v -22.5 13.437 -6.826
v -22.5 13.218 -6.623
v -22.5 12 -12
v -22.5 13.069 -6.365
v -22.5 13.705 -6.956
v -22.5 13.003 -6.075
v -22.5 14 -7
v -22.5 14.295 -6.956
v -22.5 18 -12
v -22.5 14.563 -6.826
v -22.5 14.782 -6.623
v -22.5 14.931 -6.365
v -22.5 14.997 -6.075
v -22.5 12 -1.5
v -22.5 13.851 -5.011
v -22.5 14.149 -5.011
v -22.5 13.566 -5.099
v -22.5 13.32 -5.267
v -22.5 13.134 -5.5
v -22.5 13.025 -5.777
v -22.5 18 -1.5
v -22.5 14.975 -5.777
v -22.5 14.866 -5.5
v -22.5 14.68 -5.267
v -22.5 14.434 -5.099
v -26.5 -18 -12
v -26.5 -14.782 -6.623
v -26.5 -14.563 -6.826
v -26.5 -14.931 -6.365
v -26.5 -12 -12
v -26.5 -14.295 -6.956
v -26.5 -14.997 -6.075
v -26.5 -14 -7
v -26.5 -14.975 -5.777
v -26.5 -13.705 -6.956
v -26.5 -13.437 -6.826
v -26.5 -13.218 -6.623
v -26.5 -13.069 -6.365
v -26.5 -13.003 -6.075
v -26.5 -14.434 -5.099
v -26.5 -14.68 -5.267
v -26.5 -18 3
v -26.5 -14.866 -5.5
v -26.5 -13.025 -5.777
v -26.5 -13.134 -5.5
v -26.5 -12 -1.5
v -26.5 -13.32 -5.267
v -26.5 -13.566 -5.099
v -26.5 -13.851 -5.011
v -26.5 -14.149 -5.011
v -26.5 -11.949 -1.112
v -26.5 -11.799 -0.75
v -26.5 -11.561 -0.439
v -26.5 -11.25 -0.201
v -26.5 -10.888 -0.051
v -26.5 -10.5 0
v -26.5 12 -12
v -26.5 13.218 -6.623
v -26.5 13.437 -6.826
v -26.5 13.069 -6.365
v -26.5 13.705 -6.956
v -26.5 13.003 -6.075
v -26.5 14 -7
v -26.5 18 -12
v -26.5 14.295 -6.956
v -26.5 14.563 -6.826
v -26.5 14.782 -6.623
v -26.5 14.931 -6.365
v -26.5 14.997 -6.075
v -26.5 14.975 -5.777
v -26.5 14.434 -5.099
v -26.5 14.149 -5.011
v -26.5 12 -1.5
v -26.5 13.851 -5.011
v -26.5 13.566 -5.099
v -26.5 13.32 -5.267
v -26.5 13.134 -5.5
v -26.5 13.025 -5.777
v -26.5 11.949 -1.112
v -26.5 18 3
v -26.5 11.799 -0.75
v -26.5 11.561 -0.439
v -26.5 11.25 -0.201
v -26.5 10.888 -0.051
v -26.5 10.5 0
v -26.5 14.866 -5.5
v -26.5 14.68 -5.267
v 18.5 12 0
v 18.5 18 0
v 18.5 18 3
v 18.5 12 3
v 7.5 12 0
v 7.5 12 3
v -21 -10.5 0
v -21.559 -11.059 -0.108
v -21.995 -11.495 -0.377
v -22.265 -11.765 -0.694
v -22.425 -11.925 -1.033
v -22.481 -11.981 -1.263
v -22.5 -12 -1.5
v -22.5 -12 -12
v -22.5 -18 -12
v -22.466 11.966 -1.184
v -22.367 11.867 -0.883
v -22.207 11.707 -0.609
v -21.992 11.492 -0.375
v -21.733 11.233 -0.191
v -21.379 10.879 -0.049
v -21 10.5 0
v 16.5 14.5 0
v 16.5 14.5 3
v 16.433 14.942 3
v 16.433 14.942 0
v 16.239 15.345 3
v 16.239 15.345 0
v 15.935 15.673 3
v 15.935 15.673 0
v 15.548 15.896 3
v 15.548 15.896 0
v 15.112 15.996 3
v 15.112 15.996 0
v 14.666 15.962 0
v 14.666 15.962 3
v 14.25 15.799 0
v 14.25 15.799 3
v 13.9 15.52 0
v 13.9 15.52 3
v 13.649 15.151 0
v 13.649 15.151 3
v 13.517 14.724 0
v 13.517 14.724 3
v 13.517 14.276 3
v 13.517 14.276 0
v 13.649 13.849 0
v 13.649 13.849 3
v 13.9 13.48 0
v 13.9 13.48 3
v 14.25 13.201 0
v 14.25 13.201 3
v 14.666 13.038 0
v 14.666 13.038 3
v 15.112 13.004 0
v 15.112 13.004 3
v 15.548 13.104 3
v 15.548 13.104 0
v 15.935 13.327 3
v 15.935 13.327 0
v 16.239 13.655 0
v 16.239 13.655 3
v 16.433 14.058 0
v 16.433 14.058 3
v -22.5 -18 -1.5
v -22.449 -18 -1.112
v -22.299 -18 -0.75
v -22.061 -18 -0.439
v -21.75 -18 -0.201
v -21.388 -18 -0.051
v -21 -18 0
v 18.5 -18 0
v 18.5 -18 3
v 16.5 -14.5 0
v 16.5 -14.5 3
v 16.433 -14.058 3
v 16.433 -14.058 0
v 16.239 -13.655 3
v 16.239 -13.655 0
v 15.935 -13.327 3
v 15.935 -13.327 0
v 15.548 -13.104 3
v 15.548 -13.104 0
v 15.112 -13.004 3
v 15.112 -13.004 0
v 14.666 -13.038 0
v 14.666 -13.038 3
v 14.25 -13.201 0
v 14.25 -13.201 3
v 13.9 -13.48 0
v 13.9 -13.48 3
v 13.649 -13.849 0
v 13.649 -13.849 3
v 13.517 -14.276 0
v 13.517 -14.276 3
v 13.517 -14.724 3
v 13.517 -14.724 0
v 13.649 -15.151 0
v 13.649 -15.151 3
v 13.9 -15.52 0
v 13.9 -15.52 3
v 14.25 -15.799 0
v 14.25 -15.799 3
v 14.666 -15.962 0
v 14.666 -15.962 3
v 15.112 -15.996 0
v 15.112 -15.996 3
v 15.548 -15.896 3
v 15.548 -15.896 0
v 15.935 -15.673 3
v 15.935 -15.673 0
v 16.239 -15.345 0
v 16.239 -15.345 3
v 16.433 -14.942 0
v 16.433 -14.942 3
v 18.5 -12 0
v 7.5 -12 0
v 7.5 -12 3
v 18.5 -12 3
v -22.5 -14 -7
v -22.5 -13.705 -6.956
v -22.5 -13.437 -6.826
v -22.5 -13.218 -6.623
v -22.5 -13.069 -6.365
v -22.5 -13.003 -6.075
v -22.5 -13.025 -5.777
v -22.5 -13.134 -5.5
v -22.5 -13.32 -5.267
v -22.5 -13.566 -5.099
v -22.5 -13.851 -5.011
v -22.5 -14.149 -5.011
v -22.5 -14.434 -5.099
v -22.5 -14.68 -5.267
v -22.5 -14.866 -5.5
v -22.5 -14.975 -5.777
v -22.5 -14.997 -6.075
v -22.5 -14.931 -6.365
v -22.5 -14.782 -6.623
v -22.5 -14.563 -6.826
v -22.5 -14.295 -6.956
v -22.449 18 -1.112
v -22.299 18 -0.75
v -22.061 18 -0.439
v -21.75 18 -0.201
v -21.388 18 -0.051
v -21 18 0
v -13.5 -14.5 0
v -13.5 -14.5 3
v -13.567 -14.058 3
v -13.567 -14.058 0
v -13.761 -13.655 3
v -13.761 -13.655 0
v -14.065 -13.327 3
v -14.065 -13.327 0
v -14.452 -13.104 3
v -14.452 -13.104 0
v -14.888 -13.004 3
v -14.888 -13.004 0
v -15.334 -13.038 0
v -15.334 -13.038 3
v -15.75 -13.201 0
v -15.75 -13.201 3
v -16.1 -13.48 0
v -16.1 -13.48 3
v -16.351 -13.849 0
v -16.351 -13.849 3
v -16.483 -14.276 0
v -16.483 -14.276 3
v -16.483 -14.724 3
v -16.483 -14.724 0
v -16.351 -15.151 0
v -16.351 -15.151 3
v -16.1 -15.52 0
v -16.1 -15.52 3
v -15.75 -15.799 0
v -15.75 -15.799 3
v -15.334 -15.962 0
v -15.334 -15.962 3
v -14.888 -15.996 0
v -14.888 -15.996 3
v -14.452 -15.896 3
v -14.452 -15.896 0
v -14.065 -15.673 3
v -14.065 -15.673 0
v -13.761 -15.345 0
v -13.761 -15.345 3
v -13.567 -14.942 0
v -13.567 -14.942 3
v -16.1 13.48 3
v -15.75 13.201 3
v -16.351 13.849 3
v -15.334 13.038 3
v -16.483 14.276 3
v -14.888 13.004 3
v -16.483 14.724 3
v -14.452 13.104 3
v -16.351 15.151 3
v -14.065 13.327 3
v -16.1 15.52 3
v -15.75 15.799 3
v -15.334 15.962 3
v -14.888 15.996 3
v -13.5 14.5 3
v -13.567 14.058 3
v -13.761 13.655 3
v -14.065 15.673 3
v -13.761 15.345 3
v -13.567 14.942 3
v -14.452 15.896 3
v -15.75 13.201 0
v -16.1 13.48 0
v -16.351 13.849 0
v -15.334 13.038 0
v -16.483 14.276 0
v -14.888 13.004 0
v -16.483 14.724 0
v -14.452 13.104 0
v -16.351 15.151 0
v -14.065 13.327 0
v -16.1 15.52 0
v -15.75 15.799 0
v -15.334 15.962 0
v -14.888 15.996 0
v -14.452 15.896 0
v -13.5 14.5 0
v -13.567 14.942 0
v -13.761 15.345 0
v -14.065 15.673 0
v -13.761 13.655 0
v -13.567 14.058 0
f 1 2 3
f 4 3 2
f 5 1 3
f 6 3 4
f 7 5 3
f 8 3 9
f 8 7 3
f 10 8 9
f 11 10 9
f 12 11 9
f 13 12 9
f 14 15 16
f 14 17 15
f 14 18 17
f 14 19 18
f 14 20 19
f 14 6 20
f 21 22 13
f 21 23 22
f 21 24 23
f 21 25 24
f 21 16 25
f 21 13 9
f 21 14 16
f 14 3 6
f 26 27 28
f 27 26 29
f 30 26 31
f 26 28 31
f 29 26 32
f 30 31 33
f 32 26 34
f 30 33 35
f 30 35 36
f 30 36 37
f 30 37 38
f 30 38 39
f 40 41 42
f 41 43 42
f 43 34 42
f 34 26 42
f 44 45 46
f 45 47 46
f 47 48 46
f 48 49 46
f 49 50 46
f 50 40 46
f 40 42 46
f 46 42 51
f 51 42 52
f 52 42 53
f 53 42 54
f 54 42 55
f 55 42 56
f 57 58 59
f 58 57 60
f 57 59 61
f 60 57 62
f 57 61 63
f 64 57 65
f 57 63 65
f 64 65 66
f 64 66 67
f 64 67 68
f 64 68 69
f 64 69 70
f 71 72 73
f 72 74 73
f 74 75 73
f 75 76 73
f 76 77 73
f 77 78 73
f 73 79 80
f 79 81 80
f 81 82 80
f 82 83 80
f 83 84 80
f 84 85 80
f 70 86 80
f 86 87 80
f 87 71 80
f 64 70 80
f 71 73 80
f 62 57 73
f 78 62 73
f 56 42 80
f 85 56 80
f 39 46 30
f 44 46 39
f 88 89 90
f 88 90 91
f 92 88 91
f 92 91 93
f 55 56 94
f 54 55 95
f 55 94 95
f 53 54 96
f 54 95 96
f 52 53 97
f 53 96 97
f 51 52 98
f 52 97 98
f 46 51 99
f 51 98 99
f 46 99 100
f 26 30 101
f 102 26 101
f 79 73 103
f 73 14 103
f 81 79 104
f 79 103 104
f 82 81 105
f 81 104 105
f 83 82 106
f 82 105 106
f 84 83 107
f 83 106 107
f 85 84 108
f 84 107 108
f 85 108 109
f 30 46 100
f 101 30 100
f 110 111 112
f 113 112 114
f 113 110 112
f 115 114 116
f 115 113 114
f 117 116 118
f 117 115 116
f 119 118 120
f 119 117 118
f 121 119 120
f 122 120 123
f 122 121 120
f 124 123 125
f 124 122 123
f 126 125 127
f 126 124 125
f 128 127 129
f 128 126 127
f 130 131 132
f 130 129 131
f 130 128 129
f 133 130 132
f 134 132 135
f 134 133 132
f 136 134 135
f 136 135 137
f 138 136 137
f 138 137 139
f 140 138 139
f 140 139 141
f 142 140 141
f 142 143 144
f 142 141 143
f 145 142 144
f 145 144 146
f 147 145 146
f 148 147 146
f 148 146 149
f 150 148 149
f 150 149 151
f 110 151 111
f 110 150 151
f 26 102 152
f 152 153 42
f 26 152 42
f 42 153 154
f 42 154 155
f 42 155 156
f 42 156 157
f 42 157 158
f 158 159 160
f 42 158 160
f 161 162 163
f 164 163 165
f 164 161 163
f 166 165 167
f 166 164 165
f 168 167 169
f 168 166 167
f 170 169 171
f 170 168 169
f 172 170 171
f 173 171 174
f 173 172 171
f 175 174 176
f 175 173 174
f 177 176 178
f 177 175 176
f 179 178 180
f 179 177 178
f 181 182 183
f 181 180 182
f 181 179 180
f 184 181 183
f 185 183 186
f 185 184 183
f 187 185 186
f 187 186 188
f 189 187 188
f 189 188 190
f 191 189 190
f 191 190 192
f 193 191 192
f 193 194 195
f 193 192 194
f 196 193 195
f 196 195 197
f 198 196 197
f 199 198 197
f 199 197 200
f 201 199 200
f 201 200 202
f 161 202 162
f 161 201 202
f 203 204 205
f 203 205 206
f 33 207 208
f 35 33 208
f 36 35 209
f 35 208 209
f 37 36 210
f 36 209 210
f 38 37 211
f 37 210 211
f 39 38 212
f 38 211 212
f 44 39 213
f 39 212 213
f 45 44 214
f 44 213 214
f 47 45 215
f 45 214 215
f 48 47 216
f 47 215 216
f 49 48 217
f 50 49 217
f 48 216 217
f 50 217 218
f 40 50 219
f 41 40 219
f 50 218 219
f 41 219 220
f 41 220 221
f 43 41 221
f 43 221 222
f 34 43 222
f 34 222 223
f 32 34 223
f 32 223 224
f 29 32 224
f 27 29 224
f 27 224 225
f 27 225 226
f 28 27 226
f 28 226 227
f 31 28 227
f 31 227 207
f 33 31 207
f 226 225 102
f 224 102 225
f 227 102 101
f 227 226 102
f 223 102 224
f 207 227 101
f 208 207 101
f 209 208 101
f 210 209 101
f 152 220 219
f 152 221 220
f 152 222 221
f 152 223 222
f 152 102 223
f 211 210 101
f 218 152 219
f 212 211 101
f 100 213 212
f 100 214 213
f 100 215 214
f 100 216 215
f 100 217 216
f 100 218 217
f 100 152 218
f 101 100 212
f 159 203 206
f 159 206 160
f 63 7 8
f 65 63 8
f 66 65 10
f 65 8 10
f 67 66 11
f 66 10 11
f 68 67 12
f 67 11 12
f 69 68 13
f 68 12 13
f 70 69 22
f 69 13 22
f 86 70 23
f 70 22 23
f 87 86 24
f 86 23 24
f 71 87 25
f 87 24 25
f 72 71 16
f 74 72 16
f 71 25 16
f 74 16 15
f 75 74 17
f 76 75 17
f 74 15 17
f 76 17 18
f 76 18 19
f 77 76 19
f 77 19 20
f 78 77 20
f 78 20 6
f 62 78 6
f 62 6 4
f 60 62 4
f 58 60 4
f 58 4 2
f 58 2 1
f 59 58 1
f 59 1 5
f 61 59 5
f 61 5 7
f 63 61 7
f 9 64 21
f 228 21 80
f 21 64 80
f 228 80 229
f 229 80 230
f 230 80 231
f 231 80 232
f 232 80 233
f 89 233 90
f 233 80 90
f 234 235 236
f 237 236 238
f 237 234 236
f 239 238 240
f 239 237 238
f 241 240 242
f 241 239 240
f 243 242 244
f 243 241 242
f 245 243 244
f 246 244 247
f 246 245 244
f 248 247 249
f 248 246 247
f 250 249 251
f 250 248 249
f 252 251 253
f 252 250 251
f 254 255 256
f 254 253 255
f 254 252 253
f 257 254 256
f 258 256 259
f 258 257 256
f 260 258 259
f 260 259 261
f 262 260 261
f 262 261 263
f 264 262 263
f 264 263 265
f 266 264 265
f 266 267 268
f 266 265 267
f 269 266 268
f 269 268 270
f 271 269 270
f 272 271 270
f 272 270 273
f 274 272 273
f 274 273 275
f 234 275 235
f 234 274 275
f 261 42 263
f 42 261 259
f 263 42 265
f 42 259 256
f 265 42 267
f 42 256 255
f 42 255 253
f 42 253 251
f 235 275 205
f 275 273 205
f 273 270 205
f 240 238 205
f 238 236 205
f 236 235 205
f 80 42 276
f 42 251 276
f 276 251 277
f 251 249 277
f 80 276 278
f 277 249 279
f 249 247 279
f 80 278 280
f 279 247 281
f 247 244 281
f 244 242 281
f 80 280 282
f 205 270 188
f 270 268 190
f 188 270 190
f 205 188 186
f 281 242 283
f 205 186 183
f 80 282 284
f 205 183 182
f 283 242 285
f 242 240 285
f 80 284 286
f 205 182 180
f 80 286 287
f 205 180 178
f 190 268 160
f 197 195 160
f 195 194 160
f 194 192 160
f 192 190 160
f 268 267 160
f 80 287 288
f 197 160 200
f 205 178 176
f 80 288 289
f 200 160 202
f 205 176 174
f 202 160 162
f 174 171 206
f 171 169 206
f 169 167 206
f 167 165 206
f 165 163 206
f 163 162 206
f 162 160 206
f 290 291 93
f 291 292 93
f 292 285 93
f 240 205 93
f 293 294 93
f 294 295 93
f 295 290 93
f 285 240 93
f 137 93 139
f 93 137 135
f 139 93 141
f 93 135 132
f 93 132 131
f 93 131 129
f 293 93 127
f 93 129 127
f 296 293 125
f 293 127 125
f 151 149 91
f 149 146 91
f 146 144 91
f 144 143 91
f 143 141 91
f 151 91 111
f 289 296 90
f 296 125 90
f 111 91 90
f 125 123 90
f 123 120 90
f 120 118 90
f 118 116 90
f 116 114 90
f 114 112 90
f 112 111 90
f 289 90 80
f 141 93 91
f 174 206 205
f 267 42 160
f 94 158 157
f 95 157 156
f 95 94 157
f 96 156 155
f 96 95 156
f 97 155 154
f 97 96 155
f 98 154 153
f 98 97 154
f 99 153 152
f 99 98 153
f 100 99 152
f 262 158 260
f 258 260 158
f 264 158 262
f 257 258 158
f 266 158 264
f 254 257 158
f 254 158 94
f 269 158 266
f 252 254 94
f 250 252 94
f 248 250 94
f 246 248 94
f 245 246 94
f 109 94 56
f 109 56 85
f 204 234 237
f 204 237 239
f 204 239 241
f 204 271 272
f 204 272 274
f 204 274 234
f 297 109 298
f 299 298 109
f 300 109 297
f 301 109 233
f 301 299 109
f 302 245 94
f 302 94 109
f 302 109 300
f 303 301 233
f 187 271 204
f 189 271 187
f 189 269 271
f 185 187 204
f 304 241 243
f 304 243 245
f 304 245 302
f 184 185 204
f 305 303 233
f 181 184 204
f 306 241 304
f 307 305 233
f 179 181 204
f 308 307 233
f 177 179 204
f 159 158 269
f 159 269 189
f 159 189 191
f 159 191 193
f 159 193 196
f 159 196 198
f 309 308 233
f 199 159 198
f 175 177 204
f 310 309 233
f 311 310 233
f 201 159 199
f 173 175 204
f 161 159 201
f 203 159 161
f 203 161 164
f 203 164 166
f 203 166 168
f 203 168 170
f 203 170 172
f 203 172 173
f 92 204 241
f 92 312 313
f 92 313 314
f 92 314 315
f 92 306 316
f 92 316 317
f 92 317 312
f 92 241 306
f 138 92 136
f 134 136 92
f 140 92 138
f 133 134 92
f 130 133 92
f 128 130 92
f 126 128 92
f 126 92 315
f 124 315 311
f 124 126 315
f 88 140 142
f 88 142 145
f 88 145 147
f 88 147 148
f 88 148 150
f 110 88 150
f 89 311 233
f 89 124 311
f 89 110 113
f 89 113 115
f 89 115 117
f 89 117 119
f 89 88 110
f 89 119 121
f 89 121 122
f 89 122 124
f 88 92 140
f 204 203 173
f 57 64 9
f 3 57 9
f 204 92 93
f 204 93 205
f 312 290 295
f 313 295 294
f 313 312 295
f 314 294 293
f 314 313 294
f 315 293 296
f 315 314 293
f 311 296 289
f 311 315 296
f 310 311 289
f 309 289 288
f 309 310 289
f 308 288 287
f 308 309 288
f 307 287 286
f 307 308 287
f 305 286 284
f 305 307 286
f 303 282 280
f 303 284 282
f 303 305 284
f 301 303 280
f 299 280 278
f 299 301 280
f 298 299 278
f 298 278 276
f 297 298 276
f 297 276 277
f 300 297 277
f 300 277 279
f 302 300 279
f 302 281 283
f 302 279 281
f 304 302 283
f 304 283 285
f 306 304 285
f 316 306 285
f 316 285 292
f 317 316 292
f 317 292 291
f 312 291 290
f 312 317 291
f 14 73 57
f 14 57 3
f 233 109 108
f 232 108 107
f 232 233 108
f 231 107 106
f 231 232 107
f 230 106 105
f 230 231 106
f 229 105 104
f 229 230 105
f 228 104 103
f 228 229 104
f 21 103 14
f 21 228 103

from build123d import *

# Parameters (mm, degrees)
BOSS_EXTRUDE1_DEPTH = 3
CUT_EXTRUDE1_REACH  = 5
SKETCH2_R           = 1.5
SKETCH6_W           = 3
SKETCH6_H           = 36
BOSS_EXTRUDE3_DEPTH = 8
SKETCH9_W           = 4
SKETCH9_H           = 6
BOSS_EXTRUDE4_DEPTH = 12
CUT_EXTRUDE2_REACH  = 6
SKETCH10_R          = 1
FILLET1_R           = 1.5


with BuildPart() as part:
    # Sketch1 → Boss-Extrude1 (new body)
    with BuildSketch(Plane.XY):
        Polygon((-18.5, 18), (18.5, 18), (18.5, 12), (7.5, 12), (7.5, -12), (18.5, -12), (18.5, -18), (-18.5, -18), align=None)
    extrude(amount=BOSS_EXTRUDE1_DEPTH)

    # Sketch2 → Cut-Extrude1 (cut, up to next)
    with BuildSketch(Plane.XY, mode=Mode.PRIVATE) as cut_extrude1_sk1:
        with Locations((-15, -14.5)):
            Circle(SKETCH2_R)
    cut_extrude1_tool1 = extrude(cut_extrude1_sk1.sketch, amount=CUT_EXTRUDE1_REACH, mode=Mode.PRIVATE) & part.part
    add(cut_extrude1_tool1.solids().sort_by_distance((-15, -14.5, 0))[0], mode=Mode.SUBTRACT)
    # Sketch2 → Cut-Extrude1 (cut, up to next)
    with BuildSketch(Plane.XY, mode=Mode.PRIVATE) as cut_extrude1_sk2:
        with Locations((15, -14.5)):
            Circle(SKETCH2_R)
    cut_extrude1_tool2 = extrude(cut_extrude1_sk2.sketch, amount=CUT_EXTRUDE1_REACH, mode=Mode.PRIVATE) & part.part
    add(cut_extrude1_tool2.solids().sort_by_distance((15, -14.5, 0))[0], mode=Mode.SUBTRACT)
    # Sketch2 → Cut-Extrude1 (cut, up to next)
    with BuildSketch(Plane.XY, mode=Mode.PRIVATE) as cut_extrude1_sk3:
        with Locations((15, 14.5)):
            Circle(SKETCH2_R)
    cut_extrude1_tool3 = extrude(cut_extrude1_sk3.sketch, amount=CUT_EXTRUDE1_REACH, mode=Mode.PRIVATE) & part.part
    add(cut_extrude1_tool3.solids().sort_by_distance((15, 14.5, 0))[0], mode=Mode.SUBTRACT)
    # Sketch2 → Cut-Extrude1 (cut, up to next)
    with BuildSketch(Plane.XY, mode=Mode.PRIVATE) as cut_extrude1_sk4:
        with Locations((-15, 14.5)):
            Circle(SKETCH2_R)
    cut_extrude1_tool4 = extrude(cut_extrude1_sk4.sketch, amount=CUT_EXTRUDE1_REACH, mode=Mode.PRIVATE) & part.part
    add(cut_extrude1_tool4.solids().sort_by_distance((-15, 14.5, 0))[0], mode=Mode.SUBTRACT)

    # Sketch6 → Boss-Extrude3 (add)
    with BuildSketch(Plane.ZY.offset(18.5)):
        with Locations((1.5, 0)):
            Rectangle(SKETCH6_W, SKETCH6_H)
    extrude(amount=BOSS_EXTRUDE3_DEPTH)

    # Sketch9 → Boss-Extrude4 (add)
    with BuildSketch(Plane.XY):
        with Locations((-24.5, 15)):
            Rectangle(SKETCH9_W, SKETCH9_H)
        with Locations((-24.5, -15)):
            Rectangle(SKETCH9_W, SKETCH9_H)
    extrude(amount=-BOSS_EXTRUDE4_DEPTH)

    # Sketch10 → Cut-Extrude2 (cut, up to next)
    with BuildSketch(Plane(origin=(-22.5, 0, 0), x_dir=(0, 0, -1), z_dir=(1, 0, 0)), mode=Mode.PRIVATE) as cut_extrude2_sk1:
        with Locations((6, 14)):
            Circle(SKETCH10_R)
    cut_extrude2_tool1 = extrude(cut_extrude2_sk1.sketch, amount=-CUT_EXTRUDE2_REACH, mode=Mode.PRIVATE) & part.part
    add(cut_extrude2_tool1.solids().sort_by_distance((-22.5, 14, -6))[0], mode=Mode.SUBTRACT)
    # Sketch10 → Cut-Extrude2 (cut, up to next)
    with BuildSketch(Plane(origin=(-22.5, 0, 0), x_dir=(0, 0, -1), z_dir=(1, 0, 0)), mode=Mode.PRIVATE) as cut_extrude2_sk2:
        with Locations((6, -14)):
            Circle(SKETCH10_R)
    cut_extrude2_tool2 = extrude(cut_extrude2_sk2.sketch, amount=-CUT_EXTRUDE2_REACH, mode=Mode.PRIVATE) & part.part
    add(cut_extrude2_tool2.solids().sort_by_distance((-22.5, -14, -6))[0], mode=Mode.SUBTRACT)

    # Fillet1
    fillet1_edges = [part.edges().sort_by_distance(p)[0] for p in [
        (-24.5, 12, 0),
        (-22.5, 15, 0),
        (-24.5, -12, 0),
        (-22.5, -15, 0),
    ]]
    fillet(fillet1_edges, radius=FILLET1_R)


solid = part.part
